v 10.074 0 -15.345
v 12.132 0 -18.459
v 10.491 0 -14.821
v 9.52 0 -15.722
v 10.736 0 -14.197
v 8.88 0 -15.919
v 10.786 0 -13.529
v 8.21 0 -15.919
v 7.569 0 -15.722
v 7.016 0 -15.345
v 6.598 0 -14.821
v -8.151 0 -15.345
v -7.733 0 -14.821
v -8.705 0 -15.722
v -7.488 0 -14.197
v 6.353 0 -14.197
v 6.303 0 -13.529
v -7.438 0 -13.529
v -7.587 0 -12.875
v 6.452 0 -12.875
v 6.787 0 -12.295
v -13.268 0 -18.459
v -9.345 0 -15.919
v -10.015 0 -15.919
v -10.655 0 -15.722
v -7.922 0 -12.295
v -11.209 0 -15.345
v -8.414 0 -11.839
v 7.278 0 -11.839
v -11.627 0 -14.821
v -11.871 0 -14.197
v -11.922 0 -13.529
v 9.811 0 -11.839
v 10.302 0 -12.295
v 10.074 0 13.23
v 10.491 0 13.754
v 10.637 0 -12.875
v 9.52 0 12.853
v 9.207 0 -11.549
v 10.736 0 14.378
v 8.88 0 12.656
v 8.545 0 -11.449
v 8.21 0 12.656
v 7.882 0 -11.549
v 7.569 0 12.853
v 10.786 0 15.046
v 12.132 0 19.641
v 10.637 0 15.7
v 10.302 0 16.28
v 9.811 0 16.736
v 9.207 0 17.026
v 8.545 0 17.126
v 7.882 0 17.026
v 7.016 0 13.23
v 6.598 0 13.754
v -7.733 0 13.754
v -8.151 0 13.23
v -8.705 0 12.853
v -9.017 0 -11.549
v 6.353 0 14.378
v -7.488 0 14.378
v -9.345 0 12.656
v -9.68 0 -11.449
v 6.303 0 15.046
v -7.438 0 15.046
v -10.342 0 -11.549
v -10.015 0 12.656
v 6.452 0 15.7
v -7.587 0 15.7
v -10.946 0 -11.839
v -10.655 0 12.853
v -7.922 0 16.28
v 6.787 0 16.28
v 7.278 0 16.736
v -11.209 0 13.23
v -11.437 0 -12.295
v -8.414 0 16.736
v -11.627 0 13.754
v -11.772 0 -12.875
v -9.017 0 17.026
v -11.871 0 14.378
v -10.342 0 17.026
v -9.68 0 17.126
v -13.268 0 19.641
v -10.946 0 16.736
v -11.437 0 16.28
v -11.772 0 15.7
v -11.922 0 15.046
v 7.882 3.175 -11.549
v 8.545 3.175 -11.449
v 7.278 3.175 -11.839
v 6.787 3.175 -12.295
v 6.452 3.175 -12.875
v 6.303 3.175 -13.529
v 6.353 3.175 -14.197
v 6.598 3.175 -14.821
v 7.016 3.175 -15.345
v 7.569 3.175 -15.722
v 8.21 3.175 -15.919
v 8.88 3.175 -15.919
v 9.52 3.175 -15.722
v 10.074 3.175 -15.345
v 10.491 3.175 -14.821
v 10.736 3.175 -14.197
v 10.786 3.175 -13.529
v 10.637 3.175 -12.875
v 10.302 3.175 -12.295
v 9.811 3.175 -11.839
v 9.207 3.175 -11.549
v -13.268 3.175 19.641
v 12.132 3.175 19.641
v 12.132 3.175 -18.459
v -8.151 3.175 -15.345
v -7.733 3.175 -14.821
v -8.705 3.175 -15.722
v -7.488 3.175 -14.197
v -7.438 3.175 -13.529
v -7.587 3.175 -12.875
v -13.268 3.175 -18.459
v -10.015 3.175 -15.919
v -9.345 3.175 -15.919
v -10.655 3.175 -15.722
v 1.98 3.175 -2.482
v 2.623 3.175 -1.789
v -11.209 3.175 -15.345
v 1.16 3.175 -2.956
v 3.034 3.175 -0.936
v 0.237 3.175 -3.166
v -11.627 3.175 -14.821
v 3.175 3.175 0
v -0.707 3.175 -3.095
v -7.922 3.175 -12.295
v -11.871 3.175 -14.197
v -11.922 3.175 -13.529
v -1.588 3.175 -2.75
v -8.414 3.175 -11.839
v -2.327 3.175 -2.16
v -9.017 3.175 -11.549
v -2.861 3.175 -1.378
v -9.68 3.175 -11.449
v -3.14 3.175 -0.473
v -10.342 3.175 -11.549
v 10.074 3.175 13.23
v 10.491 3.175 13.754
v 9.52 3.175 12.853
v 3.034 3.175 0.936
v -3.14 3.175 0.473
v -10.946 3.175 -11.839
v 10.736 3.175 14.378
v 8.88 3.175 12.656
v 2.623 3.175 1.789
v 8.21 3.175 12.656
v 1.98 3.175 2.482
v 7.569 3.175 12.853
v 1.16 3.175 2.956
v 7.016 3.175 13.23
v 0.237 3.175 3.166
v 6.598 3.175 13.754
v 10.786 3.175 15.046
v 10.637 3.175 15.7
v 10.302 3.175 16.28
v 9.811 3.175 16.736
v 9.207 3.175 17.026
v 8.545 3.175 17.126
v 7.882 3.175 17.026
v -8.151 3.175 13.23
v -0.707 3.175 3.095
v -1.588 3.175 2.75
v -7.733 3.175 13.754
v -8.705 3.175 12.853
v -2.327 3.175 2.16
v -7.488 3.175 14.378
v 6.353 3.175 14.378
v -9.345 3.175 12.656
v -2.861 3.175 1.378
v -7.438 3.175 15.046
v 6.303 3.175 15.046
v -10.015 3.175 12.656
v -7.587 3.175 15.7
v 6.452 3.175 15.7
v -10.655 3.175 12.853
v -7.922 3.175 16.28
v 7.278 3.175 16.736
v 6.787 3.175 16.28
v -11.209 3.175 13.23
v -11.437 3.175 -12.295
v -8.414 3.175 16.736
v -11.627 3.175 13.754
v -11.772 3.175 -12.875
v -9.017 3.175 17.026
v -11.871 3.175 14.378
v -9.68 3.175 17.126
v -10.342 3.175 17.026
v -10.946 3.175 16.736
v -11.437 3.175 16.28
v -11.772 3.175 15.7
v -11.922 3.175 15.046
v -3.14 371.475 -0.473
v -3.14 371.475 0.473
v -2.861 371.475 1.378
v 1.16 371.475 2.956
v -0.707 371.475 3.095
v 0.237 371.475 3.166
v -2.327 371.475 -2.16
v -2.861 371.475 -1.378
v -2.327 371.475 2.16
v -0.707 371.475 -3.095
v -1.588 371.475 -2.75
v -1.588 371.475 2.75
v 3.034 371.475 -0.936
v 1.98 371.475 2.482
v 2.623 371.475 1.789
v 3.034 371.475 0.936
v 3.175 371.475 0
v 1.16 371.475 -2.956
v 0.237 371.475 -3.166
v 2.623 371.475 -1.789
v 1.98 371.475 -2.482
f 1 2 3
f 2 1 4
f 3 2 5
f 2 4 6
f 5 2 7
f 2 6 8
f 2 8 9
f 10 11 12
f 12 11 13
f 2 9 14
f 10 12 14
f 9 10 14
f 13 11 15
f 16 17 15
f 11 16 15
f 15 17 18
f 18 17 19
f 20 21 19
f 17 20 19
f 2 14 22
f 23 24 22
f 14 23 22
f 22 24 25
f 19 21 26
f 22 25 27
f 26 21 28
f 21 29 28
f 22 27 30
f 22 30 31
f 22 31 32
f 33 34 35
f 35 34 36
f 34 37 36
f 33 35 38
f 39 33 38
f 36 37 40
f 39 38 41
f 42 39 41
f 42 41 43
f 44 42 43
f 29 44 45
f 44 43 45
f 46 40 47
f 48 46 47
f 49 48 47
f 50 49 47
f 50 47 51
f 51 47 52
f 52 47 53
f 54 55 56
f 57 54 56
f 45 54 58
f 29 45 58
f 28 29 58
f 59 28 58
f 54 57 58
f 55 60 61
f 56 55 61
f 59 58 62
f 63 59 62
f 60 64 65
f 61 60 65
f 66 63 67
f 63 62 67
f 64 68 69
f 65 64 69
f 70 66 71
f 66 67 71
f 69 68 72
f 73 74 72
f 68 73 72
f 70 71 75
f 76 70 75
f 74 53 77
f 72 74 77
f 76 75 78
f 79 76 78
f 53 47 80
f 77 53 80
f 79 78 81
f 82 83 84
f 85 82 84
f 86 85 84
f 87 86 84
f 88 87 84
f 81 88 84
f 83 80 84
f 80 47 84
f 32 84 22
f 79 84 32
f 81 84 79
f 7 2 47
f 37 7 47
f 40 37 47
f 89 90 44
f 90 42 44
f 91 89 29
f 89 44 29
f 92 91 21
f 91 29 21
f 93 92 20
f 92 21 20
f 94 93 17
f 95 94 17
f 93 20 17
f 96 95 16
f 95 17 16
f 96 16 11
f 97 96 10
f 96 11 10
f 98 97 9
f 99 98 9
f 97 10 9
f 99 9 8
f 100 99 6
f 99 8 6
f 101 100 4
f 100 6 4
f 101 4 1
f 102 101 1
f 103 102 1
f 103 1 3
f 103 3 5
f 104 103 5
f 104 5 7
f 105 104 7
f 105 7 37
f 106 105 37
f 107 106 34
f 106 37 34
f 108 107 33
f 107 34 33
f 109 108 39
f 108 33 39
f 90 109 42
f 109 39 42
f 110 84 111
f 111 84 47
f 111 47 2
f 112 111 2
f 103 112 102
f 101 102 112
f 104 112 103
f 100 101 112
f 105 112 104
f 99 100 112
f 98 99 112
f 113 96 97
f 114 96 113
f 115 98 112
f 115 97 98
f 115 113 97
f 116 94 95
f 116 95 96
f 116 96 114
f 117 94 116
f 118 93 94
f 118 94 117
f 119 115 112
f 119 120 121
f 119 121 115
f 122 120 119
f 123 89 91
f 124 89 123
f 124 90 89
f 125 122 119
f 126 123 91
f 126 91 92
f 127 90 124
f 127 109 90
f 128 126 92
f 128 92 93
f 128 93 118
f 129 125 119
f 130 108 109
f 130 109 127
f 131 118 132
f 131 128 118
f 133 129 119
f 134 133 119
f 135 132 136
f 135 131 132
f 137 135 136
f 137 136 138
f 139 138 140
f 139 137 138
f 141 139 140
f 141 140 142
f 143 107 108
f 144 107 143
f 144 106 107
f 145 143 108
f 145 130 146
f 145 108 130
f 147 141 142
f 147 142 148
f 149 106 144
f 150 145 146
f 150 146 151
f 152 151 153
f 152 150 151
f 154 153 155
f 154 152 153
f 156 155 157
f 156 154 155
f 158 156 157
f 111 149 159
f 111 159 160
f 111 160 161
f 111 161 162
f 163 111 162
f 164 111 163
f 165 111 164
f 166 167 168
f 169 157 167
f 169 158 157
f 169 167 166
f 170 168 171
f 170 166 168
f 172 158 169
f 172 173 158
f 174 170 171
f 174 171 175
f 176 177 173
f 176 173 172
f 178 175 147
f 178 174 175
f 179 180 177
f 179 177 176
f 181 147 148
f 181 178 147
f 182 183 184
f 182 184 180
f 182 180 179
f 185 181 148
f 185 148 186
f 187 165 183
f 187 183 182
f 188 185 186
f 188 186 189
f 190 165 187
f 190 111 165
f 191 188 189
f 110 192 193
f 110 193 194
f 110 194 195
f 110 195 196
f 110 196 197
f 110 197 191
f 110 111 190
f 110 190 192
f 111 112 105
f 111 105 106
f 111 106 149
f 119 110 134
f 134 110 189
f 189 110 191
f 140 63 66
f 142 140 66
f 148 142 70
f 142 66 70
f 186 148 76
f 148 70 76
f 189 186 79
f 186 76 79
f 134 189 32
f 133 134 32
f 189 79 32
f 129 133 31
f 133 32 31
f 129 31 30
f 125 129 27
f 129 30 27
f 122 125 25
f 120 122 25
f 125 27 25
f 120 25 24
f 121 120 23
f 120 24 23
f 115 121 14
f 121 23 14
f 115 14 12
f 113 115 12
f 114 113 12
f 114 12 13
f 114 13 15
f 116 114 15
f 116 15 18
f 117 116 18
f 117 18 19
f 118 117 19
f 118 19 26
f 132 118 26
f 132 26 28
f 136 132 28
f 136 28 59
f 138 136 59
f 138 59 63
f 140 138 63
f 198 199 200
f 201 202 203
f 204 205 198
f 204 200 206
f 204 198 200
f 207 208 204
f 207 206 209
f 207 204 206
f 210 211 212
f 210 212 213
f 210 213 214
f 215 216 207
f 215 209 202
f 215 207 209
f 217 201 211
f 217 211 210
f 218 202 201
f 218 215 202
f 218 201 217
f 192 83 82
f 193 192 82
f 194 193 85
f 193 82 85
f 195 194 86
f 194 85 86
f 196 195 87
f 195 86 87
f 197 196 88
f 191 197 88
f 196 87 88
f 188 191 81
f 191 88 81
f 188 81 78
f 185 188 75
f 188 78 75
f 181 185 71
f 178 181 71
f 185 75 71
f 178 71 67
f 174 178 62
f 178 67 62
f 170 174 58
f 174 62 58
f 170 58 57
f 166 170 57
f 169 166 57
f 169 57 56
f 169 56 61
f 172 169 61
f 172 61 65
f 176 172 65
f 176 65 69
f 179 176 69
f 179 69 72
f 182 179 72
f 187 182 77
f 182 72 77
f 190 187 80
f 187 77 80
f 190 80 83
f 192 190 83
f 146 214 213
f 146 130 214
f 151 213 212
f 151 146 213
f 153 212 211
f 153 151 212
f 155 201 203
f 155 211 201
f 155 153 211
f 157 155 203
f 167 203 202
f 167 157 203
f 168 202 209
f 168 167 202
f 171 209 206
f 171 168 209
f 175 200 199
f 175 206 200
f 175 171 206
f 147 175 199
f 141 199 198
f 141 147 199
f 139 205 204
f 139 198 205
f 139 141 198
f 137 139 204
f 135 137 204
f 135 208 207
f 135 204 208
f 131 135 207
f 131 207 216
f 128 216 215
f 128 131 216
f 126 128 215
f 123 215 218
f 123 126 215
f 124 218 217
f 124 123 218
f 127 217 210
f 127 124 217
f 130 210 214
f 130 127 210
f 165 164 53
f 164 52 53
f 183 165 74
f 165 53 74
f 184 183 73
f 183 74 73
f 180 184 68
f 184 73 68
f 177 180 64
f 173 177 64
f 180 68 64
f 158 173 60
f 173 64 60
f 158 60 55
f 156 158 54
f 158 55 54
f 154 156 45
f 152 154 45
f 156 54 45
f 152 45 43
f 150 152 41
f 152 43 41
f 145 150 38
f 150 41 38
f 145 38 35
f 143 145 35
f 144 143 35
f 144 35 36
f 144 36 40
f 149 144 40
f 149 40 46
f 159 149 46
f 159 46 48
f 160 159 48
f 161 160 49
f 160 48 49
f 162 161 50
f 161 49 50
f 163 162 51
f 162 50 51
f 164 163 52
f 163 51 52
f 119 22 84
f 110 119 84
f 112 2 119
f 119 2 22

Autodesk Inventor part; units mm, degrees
ref_plane "YZ Plane" through (0, 0, 0) normal (1, 0, 0) x (0, 1, 0)
ref_plane "XZ Plane" through (0, 0, 0) normal (0, 1, 0) x (-1, 0, 0)
ref_plane "XY Plane" through (0, 0, 0) normal (0, 0, 1) x (1, 0, 0)
sketch "Sketch1" plane through (0, 0, 0) normal (0, 1, 0) x (-1, 0, 0)
  line L0 (13.2677, 19.6408) -> (-12.1323, 19.6408)
  line L1 (-12.1323, 19.6408) -> (-12.1323, -18.4592)
  line L2 (-12.1323, -18.4592) -> (13.2677, -18.4592)
  line L3 (13.2677, -18.4592) -> (13.2677, 19.6408)
  point P0 (0, 0)
  dimension "d0" = 25.4
  dimension "d1" = 38.1
extrude "Extrusion1" add sketch "Sketch1" along normal blind 3.175
hole "Hole1" at (-9.6799, 3.175, 14.8783) direction (0, -1, 0) diameter 4.4958 depth 3.175 clearance for "Flat Head Machine Screw (82)" size "#8" standard "Ansi Unified Screw Threads"
hole "Hole2" at (8.5446, 3.175, 14.8783) direction (0, -1, 0) diameter 4.4958 depth 3.175 clearance for "Flat Head Machine Screw (82)" size "#8" standard "Ansi Unified Screw Threads"
hole "Hole3" at (-9.6799, 3.175, -13.6967) direction (0, -1, 0) diameter 4.4958 depth 3.175 clearance for "Flat Head Machine Screw (82)" size "#8" standard "Ansi Unified Screw Threads"
hole "Hole4" at (8.5446, 3.175, -13.6967) direction (0, -1, 0) diameter 4.4958 depth 3.175 clearance for "Flat Head Machine Screw (82)" size "#8" standard "Ansi Unified Screw Threads"
sketch "Sketch2" plane through (0, 3.175, 0) normal (0, 1, 0) x (1, 0, 0)
  circle A0 centre (0, 0) radius 3.175
  dimension "d58" = 6.35
extrude "Extrusion2" add sketch "Sketch2" along normal blind 304.8
sketch "Sketch3" plane through (0, 0, 0) normal (1, 0, 0) x (0, 1, 0)
  point P0 (0, 0)
sketch "Sketch4" plane through (0, 307.975, 0) normal (0, 1, 0) x (1, 0, 0)
  circle A0 centre (0, 0) radius 3.175 projected
extrude "Extrusion3" add sketch "Sketch4" along normal blind 63.5
sketch "Sketch5" plane through (0, 0, 0) normal (1, 0, 0) x (0, 1, 0)
  point P0 (0, 0)
properties part number "rotatable rod table"
